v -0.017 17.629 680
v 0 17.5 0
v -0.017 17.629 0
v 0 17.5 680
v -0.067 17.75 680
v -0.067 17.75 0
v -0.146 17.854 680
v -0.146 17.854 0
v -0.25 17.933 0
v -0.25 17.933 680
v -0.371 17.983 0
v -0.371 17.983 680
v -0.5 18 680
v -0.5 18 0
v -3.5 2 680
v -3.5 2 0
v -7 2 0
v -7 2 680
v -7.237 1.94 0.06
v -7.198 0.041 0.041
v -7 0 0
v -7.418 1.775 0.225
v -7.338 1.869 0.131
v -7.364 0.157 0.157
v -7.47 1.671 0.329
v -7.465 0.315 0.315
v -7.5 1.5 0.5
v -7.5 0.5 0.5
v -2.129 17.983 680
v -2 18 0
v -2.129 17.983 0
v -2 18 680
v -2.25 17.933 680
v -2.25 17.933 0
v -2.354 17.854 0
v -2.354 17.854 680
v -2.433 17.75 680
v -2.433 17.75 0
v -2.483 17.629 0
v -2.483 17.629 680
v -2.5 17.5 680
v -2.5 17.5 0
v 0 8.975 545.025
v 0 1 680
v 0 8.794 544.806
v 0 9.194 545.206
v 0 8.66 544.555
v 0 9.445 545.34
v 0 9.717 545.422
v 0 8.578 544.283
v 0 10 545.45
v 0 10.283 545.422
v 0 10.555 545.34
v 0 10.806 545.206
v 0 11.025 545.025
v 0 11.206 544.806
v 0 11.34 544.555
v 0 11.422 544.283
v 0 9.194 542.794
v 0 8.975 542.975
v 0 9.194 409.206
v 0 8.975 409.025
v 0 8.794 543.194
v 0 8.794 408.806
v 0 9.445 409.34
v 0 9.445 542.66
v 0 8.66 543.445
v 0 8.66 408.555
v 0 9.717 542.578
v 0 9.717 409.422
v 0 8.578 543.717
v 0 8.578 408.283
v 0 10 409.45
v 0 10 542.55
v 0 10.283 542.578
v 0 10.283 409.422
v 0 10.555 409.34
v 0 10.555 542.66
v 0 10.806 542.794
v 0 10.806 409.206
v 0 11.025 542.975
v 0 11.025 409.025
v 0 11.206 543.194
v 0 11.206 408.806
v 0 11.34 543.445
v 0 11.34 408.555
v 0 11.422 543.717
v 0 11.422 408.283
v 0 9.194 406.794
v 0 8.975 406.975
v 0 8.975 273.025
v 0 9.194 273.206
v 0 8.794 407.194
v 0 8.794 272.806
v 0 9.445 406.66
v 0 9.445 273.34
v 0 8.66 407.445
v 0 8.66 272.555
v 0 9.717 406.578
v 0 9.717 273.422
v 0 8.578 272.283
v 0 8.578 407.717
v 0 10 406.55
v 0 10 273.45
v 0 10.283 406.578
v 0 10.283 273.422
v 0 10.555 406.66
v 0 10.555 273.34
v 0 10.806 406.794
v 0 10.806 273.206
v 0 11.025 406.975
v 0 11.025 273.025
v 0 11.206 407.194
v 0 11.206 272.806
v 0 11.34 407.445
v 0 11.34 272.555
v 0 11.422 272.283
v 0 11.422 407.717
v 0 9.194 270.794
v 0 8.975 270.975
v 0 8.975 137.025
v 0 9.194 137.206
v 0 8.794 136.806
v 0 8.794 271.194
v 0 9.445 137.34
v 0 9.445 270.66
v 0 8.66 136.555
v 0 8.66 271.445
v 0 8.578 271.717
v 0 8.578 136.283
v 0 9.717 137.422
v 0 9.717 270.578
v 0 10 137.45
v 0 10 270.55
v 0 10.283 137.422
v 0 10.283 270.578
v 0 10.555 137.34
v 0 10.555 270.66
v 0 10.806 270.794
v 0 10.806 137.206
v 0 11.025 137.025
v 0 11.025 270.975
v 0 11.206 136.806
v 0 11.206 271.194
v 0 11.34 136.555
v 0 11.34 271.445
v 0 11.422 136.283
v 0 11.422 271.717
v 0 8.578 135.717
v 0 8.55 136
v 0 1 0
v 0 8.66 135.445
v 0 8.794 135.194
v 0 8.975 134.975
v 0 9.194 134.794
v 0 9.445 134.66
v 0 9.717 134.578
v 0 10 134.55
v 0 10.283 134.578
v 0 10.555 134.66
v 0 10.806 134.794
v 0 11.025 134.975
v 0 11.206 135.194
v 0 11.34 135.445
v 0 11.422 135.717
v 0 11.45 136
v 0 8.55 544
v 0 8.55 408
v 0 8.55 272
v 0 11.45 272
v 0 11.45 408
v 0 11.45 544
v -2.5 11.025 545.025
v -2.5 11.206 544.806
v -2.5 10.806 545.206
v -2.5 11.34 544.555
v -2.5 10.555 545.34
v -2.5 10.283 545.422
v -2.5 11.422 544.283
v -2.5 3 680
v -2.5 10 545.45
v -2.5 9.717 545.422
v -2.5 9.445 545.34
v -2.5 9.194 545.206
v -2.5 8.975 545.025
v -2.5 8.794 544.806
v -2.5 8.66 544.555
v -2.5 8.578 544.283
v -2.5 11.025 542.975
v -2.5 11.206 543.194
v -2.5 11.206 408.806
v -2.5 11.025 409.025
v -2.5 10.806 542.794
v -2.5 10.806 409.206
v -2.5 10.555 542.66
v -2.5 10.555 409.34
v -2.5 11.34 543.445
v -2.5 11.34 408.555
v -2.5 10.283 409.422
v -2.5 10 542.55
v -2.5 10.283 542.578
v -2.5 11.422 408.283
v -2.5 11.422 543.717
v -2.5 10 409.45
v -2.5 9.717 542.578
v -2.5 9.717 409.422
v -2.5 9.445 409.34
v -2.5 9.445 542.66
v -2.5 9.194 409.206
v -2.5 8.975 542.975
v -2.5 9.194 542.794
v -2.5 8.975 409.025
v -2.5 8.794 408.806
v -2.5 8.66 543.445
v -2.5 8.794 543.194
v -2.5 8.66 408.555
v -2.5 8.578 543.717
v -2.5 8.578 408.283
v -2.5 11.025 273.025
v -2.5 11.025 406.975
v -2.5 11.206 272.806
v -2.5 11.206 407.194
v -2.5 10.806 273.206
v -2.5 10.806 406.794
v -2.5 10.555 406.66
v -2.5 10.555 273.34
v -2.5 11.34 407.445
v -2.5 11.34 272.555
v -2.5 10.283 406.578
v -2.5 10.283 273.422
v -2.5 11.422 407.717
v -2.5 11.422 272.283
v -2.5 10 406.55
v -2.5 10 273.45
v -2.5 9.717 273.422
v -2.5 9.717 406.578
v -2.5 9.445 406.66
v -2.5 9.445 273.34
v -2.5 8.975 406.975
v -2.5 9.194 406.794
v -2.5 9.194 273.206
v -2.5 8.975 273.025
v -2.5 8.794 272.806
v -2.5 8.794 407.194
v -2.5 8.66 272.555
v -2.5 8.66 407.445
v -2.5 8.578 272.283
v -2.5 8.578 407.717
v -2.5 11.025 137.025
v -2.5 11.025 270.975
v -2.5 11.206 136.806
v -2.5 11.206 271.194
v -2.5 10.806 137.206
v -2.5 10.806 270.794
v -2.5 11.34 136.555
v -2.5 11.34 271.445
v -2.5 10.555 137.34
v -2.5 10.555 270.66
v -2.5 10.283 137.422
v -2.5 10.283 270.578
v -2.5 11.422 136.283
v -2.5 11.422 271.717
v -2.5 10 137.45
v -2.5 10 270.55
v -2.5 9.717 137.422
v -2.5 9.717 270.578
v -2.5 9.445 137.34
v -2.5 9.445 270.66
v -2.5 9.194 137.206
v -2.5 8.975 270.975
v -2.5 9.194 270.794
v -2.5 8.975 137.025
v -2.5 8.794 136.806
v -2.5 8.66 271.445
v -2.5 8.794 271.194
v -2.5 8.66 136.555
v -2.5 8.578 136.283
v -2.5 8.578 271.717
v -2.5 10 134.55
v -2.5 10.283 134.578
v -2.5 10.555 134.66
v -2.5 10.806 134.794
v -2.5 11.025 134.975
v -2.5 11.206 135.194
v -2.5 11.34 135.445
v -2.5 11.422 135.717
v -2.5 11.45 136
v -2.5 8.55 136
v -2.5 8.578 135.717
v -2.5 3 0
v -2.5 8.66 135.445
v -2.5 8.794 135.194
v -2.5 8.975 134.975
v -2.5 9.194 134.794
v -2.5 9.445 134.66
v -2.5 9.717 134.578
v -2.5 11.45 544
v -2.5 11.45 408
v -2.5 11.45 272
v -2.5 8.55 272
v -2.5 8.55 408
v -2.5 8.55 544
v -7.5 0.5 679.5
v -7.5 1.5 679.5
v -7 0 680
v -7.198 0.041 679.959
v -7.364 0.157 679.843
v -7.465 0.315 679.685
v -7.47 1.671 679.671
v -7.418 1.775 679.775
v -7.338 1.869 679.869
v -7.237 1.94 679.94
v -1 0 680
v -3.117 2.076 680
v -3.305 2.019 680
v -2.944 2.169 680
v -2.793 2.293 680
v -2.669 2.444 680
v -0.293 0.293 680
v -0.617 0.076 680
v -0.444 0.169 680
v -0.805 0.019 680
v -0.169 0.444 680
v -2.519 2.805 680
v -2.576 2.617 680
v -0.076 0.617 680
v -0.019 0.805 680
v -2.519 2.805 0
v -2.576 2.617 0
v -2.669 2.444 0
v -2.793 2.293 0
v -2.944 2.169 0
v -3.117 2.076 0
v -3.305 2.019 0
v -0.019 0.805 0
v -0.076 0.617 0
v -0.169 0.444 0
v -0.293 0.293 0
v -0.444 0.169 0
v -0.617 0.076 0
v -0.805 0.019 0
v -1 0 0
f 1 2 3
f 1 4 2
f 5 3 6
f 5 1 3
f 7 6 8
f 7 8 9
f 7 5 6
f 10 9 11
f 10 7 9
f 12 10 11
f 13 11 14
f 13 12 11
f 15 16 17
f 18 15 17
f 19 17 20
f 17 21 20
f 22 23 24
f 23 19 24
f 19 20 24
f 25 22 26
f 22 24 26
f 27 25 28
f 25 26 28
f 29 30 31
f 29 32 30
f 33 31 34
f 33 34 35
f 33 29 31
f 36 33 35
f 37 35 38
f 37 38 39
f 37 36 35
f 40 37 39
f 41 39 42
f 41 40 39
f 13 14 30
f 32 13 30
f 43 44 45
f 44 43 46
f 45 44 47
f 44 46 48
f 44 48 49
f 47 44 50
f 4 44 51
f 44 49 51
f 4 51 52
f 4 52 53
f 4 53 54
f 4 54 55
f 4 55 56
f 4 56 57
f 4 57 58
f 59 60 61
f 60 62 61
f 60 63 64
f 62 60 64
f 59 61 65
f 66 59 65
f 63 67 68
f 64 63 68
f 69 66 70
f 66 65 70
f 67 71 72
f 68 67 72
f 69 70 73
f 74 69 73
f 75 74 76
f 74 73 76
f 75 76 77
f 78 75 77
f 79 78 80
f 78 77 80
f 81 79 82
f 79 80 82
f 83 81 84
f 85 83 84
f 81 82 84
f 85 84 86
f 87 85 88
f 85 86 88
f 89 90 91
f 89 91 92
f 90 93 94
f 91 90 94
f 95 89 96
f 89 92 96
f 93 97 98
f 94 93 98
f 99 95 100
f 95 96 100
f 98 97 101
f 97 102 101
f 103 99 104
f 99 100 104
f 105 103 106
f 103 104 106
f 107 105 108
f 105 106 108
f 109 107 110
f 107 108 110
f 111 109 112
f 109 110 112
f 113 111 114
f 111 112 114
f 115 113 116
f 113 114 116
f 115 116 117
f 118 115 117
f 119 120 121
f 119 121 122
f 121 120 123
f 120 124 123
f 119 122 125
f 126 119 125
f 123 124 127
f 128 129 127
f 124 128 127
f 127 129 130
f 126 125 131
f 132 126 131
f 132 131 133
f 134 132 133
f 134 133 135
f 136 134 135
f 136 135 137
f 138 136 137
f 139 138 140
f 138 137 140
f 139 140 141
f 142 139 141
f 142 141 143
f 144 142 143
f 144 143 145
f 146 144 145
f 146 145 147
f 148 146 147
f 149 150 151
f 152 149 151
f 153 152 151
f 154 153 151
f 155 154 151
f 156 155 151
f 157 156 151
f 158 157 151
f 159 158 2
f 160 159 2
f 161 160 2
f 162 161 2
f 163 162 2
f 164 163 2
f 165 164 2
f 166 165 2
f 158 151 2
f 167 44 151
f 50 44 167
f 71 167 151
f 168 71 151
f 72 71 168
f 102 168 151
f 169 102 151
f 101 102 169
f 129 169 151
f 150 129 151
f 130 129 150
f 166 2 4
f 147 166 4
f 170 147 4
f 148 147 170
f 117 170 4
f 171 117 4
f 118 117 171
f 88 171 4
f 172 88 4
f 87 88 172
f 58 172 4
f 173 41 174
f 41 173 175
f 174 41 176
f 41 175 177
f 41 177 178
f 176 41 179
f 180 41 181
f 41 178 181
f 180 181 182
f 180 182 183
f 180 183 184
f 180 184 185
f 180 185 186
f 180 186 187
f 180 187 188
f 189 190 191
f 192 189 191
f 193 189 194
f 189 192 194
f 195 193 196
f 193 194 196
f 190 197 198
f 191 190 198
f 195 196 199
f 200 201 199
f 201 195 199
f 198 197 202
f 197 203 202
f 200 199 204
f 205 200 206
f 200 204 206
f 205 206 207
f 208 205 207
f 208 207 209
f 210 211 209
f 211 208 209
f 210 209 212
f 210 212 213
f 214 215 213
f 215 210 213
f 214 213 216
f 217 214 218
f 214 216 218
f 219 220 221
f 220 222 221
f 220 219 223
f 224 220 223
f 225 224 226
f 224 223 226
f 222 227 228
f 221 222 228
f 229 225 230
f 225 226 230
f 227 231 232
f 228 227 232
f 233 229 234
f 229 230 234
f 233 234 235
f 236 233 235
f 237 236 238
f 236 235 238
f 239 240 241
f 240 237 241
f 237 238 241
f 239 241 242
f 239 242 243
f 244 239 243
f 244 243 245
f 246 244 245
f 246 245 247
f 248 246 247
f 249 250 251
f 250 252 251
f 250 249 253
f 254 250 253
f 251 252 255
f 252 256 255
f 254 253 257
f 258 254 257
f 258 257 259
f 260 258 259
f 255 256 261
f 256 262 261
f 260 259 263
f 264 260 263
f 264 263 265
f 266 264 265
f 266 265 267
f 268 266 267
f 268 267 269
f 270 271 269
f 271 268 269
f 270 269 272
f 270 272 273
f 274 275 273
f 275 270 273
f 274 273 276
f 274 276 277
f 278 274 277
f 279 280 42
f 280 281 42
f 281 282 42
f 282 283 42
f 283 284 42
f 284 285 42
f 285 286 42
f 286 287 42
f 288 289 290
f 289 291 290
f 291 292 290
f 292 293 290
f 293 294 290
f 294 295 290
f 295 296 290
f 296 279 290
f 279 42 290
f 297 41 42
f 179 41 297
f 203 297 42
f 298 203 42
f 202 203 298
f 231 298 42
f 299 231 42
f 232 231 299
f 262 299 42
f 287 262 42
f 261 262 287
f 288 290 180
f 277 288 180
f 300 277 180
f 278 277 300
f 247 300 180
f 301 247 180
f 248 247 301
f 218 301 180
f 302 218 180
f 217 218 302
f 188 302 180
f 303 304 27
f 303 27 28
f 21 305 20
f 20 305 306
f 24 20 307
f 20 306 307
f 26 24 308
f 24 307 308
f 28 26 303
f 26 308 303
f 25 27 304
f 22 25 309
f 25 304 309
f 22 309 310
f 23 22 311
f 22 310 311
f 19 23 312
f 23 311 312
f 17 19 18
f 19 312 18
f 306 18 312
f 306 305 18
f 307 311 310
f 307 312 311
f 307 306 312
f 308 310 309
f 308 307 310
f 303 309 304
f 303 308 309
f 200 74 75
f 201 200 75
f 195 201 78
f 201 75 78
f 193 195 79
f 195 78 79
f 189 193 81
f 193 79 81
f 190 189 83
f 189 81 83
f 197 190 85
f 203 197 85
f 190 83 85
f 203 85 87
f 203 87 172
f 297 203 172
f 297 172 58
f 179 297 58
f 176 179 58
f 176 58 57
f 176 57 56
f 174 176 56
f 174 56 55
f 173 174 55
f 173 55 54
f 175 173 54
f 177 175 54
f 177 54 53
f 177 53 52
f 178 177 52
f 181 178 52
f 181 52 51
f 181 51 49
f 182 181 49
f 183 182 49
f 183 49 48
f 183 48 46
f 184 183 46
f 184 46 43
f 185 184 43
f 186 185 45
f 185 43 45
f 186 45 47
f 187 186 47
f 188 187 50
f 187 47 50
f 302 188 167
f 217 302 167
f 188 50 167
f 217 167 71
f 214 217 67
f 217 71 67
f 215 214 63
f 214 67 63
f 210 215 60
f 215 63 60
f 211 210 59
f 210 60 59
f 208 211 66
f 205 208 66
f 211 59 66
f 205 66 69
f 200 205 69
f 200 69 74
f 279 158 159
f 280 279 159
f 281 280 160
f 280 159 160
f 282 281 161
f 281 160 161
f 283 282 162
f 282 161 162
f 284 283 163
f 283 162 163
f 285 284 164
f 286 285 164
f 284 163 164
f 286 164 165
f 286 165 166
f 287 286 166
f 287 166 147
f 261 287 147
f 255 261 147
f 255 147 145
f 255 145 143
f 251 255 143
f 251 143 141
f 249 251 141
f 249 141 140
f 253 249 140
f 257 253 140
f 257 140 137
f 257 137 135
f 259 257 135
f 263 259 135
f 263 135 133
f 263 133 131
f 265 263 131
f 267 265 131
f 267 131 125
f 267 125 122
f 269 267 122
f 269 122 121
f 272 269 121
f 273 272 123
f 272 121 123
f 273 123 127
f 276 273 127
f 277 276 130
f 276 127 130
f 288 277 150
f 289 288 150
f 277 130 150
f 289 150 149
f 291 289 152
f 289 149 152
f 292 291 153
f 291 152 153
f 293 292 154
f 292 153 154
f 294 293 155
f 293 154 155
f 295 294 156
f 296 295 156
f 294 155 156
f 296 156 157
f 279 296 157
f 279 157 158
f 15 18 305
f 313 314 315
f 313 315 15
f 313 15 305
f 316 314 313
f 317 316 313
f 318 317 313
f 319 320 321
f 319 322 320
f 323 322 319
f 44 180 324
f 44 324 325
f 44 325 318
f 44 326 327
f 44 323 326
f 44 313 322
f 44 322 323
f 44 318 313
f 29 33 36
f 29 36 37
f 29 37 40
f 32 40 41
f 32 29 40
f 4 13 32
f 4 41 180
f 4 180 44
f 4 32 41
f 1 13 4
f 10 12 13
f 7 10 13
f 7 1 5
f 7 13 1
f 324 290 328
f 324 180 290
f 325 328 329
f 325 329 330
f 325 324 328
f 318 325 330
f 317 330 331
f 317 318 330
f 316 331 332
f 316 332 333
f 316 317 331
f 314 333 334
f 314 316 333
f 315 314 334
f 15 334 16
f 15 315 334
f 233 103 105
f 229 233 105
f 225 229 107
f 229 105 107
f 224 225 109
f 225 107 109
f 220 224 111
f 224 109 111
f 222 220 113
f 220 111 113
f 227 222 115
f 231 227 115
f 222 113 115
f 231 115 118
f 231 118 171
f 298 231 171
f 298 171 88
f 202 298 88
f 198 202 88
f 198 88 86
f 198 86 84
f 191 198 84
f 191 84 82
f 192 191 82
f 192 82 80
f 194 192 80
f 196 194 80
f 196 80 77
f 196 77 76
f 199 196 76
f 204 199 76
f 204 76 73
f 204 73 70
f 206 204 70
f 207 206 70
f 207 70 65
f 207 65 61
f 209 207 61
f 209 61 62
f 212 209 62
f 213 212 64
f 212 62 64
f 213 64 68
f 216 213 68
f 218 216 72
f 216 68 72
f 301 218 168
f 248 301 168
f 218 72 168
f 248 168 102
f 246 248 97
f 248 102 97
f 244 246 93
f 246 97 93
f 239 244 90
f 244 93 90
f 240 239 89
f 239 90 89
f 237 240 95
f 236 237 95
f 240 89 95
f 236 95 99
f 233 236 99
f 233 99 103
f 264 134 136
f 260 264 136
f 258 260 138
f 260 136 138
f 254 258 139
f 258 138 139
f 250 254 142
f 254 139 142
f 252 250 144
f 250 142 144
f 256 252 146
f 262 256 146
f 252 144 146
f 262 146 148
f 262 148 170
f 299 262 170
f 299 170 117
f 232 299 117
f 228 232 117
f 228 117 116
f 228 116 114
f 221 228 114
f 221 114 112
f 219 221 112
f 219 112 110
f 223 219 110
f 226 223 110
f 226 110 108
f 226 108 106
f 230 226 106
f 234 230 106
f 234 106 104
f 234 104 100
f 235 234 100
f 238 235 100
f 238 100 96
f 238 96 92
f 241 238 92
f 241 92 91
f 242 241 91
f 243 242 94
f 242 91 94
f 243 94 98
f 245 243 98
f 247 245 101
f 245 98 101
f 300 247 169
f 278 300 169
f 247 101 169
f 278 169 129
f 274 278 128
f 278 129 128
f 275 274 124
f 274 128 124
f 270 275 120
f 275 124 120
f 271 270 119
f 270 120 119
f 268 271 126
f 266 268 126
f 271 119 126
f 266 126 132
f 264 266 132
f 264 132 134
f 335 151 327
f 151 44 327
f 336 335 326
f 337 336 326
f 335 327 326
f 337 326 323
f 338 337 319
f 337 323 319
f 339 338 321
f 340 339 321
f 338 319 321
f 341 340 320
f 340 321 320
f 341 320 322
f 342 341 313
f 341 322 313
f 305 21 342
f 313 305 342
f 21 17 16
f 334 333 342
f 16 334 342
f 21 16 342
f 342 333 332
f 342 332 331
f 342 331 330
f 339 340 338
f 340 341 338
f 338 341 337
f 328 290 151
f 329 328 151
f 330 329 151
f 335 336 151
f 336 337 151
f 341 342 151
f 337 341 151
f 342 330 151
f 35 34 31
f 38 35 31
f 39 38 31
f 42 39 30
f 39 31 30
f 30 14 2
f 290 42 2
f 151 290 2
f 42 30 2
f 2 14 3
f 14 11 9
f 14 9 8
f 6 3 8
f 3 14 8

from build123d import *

# Parameters (mm, degrees)
EXTRUDE_1_DEPTH      = 680
HOLE_WIZARD_M3_5_1_D = 2.9
FILLET_1_R           = 1
FILLET_2_R           = 0.5


with BuildPart() as part:
    # 草图1 → 凸台-拉伸1 (new body)
    with BuildSketch(Plane.XY):
        Polygon((0, 0), (0, 18), (-2.5, 18), (-2.5, 2), (-7.5, 2), (-7.5, 0), align=None)
    extrude(amount=EXTRUDE_1_DEPTH)

    # M3.5 螺纹孔1 (through all)
    with Locations(Plane.ZY.offset(2.5)):
        with Locations((136, 10), (272, 10), (408, 10), (544, 10)):
            Hole(HOLE_WIZARD_M3_5_1_D / 2)

    # 圆角1
    fillet_1_edges = [part.edges().sort_by_distance(p)[0] for p in [
        (-2.5, 2, 340),
        (0, 0, 340),
    ]]
    fillet(fillet_1_edges, radius=FILLET_1_R)

    # 圆角2
    fillet_2_edges = [part.edges().sort_by_distance(p)[0] for p in [
        (-7.5, 0, 340),
        (-7.5, 2, 340),
        (-2.5, 18, 340),
        (0, 18, 340),
        (-7.5, 1, 680),
        (-7.5, 1, 0),
    ]]
    fillet(fillet_2_edges, radius=FILLET_2_R)


solid = part.part
